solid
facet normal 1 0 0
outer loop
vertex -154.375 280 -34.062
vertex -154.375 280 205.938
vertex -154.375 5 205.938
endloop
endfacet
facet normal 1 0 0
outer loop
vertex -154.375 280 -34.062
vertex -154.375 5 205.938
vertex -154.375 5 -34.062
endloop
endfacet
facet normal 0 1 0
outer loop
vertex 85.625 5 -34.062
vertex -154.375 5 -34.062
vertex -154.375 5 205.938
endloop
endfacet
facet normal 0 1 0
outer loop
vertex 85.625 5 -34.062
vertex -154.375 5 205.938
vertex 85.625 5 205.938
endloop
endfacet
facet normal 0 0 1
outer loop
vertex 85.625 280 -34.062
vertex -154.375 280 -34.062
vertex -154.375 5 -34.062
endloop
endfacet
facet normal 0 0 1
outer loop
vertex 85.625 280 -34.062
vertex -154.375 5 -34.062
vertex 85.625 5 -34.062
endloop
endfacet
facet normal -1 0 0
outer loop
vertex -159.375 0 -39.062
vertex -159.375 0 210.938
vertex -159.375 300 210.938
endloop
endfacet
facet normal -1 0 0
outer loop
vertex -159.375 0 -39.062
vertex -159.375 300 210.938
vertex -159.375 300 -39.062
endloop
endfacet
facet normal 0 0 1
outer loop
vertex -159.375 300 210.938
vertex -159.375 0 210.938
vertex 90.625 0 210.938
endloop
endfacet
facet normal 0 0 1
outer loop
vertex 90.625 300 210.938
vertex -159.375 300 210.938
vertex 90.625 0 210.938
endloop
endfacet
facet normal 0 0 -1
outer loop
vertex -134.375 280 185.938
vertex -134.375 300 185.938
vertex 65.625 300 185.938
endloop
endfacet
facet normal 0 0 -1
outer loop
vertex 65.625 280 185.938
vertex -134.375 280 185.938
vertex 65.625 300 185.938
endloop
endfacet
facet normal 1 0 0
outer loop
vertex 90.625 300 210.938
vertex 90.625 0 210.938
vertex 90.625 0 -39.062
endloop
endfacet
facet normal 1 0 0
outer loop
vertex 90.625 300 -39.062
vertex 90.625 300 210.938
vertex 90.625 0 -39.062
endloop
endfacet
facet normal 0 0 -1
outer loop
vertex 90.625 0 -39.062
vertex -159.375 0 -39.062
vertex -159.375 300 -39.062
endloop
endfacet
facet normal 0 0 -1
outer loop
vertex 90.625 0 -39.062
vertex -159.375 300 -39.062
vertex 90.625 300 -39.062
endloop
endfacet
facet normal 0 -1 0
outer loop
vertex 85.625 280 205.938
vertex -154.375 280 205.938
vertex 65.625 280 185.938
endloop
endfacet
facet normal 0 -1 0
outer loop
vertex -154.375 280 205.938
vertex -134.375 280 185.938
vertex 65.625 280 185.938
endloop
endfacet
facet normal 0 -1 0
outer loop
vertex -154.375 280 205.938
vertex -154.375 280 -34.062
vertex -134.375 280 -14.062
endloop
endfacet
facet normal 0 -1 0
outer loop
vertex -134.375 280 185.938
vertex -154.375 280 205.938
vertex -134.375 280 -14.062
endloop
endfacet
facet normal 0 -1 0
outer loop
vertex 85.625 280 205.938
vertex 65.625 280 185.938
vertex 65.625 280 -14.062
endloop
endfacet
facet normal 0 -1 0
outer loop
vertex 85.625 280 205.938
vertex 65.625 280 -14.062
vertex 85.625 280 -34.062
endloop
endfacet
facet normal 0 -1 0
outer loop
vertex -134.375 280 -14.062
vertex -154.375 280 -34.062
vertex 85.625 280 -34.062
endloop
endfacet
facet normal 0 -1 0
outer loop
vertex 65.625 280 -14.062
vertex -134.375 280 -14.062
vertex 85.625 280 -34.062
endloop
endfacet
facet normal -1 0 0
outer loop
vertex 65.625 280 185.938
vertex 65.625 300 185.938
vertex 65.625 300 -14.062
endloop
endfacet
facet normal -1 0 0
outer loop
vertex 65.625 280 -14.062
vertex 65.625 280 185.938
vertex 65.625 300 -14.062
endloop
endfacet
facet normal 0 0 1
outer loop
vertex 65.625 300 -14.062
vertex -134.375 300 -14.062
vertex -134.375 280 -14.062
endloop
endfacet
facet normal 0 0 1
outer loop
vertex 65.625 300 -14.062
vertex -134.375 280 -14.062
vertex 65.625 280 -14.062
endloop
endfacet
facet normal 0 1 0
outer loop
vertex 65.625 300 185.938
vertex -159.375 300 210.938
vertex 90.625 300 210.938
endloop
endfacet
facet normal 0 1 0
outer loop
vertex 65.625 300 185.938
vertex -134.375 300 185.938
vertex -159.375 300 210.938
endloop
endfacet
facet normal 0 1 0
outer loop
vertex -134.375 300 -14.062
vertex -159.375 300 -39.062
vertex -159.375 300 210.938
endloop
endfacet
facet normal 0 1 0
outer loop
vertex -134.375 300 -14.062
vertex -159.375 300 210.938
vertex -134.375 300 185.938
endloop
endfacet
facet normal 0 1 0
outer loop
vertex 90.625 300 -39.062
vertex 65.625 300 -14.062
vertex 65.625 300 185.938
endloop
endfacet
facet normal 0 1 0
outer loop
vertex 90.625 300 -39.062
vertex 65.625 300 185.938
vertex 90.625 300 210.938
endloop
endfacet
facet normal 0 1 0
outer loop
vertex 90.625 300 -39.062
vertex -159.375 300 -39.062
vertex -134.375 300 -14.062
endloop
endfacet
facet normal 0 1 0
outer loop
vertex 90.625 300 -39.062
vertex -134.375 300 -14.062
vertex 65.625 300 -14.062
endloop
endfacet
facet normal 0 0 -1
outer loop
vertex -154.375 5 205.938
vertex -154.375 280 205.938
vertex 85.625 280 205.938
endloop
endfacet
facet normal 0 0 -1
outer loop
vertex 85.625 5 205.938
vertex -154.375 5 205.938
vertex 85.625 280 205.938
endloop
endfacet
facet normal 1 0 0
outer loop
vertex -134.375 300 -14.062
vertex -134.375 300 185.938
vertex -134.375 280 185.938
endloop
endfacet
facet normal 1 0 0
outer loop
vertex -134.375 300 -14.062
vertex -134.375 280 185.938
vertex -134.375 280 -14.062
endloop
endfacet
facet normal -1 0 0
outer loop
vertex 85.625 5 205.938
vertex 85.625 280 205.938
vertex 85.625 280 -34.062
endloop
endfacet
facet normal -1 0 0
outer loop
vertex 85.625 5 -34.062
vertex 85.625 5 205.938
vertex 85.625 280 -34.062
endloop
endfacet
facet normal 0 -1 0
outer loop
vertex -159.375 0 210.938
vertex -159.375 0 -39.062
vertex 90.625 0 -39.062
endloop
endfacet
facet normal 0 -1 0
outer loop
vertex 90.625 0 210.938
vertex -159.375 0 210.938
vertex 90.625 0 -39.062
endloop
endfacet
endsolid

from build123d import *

# Parameters (mm, degrees)
SZKIC1_W                    = 250
SZKIC1_H                    = 250
DODANIE_WYCI_GNI_CIE1_DEPTH = 300
SZKIC2_W                    = 240
SZKIC2_H                    = 240
WYTNIJ_WYCI_GNI_CIE1_DEPTH  = 295
SZKIC3_W                    = 240
SZKIC3_H                    = 240
SZKIC3_W_2                  = 200
SZKIC3_H_2                  = 200
DODANIE_WYCI_GNI_CIE2_DEPTH = 20


with BuildPart() as part:
    # Szkic1 → Dodanie-wyciągnięcie1 (new body)
    with BuildSketch(Plane(origin=(0, 0, 0), x_dir=(1, 0, 0), z_dir=(0, 1, 0))):
        with Locations((-34.375, -85.9375)):
            Rectangle(SZKIC1_W, SZKIC1_H)
    extrude(amount=DODANIE_WYCI_GNI_CIE1_DEPTH)

    # Szkic2 → Wytnij-wyciągnięcie1 (cut)
    with BuildSketch(Plane(origin=(0, 300, 0), x_dir=(1, 0, 0), z_dir=(0, 1, 0))):
        with Locations((-34.375, -85.9375)):
            Rectangle(SZKIC2_W, SZKIC2_H)
    extrude(amount=-WYTNIJ_WYCI_GNI_CIE1_DEPTH, mode=Mode.SUBTRACT)

    # Szkic3 → Dodanie-wyciągnięcie2 (add)
    with BuildSketch(Plane(origin=(0, 300, 0), x_dir=(1, 0, 0), z_dir=(0, 1, 0))):
        with Locations((-34.375, -85.9375)):
            Rectangle(SZKIC3_W, SZKIC3_H)
        with Locations((-34.375, -85.9375)):
            Rectangle(SZKIC3_W_2, SZKIC3_H_2, mode=Mode.SUBTRACT)
    extrude(amount=-DODANIE_WYCI_GNI_CIE2_DEPTH)


solid = part.part
